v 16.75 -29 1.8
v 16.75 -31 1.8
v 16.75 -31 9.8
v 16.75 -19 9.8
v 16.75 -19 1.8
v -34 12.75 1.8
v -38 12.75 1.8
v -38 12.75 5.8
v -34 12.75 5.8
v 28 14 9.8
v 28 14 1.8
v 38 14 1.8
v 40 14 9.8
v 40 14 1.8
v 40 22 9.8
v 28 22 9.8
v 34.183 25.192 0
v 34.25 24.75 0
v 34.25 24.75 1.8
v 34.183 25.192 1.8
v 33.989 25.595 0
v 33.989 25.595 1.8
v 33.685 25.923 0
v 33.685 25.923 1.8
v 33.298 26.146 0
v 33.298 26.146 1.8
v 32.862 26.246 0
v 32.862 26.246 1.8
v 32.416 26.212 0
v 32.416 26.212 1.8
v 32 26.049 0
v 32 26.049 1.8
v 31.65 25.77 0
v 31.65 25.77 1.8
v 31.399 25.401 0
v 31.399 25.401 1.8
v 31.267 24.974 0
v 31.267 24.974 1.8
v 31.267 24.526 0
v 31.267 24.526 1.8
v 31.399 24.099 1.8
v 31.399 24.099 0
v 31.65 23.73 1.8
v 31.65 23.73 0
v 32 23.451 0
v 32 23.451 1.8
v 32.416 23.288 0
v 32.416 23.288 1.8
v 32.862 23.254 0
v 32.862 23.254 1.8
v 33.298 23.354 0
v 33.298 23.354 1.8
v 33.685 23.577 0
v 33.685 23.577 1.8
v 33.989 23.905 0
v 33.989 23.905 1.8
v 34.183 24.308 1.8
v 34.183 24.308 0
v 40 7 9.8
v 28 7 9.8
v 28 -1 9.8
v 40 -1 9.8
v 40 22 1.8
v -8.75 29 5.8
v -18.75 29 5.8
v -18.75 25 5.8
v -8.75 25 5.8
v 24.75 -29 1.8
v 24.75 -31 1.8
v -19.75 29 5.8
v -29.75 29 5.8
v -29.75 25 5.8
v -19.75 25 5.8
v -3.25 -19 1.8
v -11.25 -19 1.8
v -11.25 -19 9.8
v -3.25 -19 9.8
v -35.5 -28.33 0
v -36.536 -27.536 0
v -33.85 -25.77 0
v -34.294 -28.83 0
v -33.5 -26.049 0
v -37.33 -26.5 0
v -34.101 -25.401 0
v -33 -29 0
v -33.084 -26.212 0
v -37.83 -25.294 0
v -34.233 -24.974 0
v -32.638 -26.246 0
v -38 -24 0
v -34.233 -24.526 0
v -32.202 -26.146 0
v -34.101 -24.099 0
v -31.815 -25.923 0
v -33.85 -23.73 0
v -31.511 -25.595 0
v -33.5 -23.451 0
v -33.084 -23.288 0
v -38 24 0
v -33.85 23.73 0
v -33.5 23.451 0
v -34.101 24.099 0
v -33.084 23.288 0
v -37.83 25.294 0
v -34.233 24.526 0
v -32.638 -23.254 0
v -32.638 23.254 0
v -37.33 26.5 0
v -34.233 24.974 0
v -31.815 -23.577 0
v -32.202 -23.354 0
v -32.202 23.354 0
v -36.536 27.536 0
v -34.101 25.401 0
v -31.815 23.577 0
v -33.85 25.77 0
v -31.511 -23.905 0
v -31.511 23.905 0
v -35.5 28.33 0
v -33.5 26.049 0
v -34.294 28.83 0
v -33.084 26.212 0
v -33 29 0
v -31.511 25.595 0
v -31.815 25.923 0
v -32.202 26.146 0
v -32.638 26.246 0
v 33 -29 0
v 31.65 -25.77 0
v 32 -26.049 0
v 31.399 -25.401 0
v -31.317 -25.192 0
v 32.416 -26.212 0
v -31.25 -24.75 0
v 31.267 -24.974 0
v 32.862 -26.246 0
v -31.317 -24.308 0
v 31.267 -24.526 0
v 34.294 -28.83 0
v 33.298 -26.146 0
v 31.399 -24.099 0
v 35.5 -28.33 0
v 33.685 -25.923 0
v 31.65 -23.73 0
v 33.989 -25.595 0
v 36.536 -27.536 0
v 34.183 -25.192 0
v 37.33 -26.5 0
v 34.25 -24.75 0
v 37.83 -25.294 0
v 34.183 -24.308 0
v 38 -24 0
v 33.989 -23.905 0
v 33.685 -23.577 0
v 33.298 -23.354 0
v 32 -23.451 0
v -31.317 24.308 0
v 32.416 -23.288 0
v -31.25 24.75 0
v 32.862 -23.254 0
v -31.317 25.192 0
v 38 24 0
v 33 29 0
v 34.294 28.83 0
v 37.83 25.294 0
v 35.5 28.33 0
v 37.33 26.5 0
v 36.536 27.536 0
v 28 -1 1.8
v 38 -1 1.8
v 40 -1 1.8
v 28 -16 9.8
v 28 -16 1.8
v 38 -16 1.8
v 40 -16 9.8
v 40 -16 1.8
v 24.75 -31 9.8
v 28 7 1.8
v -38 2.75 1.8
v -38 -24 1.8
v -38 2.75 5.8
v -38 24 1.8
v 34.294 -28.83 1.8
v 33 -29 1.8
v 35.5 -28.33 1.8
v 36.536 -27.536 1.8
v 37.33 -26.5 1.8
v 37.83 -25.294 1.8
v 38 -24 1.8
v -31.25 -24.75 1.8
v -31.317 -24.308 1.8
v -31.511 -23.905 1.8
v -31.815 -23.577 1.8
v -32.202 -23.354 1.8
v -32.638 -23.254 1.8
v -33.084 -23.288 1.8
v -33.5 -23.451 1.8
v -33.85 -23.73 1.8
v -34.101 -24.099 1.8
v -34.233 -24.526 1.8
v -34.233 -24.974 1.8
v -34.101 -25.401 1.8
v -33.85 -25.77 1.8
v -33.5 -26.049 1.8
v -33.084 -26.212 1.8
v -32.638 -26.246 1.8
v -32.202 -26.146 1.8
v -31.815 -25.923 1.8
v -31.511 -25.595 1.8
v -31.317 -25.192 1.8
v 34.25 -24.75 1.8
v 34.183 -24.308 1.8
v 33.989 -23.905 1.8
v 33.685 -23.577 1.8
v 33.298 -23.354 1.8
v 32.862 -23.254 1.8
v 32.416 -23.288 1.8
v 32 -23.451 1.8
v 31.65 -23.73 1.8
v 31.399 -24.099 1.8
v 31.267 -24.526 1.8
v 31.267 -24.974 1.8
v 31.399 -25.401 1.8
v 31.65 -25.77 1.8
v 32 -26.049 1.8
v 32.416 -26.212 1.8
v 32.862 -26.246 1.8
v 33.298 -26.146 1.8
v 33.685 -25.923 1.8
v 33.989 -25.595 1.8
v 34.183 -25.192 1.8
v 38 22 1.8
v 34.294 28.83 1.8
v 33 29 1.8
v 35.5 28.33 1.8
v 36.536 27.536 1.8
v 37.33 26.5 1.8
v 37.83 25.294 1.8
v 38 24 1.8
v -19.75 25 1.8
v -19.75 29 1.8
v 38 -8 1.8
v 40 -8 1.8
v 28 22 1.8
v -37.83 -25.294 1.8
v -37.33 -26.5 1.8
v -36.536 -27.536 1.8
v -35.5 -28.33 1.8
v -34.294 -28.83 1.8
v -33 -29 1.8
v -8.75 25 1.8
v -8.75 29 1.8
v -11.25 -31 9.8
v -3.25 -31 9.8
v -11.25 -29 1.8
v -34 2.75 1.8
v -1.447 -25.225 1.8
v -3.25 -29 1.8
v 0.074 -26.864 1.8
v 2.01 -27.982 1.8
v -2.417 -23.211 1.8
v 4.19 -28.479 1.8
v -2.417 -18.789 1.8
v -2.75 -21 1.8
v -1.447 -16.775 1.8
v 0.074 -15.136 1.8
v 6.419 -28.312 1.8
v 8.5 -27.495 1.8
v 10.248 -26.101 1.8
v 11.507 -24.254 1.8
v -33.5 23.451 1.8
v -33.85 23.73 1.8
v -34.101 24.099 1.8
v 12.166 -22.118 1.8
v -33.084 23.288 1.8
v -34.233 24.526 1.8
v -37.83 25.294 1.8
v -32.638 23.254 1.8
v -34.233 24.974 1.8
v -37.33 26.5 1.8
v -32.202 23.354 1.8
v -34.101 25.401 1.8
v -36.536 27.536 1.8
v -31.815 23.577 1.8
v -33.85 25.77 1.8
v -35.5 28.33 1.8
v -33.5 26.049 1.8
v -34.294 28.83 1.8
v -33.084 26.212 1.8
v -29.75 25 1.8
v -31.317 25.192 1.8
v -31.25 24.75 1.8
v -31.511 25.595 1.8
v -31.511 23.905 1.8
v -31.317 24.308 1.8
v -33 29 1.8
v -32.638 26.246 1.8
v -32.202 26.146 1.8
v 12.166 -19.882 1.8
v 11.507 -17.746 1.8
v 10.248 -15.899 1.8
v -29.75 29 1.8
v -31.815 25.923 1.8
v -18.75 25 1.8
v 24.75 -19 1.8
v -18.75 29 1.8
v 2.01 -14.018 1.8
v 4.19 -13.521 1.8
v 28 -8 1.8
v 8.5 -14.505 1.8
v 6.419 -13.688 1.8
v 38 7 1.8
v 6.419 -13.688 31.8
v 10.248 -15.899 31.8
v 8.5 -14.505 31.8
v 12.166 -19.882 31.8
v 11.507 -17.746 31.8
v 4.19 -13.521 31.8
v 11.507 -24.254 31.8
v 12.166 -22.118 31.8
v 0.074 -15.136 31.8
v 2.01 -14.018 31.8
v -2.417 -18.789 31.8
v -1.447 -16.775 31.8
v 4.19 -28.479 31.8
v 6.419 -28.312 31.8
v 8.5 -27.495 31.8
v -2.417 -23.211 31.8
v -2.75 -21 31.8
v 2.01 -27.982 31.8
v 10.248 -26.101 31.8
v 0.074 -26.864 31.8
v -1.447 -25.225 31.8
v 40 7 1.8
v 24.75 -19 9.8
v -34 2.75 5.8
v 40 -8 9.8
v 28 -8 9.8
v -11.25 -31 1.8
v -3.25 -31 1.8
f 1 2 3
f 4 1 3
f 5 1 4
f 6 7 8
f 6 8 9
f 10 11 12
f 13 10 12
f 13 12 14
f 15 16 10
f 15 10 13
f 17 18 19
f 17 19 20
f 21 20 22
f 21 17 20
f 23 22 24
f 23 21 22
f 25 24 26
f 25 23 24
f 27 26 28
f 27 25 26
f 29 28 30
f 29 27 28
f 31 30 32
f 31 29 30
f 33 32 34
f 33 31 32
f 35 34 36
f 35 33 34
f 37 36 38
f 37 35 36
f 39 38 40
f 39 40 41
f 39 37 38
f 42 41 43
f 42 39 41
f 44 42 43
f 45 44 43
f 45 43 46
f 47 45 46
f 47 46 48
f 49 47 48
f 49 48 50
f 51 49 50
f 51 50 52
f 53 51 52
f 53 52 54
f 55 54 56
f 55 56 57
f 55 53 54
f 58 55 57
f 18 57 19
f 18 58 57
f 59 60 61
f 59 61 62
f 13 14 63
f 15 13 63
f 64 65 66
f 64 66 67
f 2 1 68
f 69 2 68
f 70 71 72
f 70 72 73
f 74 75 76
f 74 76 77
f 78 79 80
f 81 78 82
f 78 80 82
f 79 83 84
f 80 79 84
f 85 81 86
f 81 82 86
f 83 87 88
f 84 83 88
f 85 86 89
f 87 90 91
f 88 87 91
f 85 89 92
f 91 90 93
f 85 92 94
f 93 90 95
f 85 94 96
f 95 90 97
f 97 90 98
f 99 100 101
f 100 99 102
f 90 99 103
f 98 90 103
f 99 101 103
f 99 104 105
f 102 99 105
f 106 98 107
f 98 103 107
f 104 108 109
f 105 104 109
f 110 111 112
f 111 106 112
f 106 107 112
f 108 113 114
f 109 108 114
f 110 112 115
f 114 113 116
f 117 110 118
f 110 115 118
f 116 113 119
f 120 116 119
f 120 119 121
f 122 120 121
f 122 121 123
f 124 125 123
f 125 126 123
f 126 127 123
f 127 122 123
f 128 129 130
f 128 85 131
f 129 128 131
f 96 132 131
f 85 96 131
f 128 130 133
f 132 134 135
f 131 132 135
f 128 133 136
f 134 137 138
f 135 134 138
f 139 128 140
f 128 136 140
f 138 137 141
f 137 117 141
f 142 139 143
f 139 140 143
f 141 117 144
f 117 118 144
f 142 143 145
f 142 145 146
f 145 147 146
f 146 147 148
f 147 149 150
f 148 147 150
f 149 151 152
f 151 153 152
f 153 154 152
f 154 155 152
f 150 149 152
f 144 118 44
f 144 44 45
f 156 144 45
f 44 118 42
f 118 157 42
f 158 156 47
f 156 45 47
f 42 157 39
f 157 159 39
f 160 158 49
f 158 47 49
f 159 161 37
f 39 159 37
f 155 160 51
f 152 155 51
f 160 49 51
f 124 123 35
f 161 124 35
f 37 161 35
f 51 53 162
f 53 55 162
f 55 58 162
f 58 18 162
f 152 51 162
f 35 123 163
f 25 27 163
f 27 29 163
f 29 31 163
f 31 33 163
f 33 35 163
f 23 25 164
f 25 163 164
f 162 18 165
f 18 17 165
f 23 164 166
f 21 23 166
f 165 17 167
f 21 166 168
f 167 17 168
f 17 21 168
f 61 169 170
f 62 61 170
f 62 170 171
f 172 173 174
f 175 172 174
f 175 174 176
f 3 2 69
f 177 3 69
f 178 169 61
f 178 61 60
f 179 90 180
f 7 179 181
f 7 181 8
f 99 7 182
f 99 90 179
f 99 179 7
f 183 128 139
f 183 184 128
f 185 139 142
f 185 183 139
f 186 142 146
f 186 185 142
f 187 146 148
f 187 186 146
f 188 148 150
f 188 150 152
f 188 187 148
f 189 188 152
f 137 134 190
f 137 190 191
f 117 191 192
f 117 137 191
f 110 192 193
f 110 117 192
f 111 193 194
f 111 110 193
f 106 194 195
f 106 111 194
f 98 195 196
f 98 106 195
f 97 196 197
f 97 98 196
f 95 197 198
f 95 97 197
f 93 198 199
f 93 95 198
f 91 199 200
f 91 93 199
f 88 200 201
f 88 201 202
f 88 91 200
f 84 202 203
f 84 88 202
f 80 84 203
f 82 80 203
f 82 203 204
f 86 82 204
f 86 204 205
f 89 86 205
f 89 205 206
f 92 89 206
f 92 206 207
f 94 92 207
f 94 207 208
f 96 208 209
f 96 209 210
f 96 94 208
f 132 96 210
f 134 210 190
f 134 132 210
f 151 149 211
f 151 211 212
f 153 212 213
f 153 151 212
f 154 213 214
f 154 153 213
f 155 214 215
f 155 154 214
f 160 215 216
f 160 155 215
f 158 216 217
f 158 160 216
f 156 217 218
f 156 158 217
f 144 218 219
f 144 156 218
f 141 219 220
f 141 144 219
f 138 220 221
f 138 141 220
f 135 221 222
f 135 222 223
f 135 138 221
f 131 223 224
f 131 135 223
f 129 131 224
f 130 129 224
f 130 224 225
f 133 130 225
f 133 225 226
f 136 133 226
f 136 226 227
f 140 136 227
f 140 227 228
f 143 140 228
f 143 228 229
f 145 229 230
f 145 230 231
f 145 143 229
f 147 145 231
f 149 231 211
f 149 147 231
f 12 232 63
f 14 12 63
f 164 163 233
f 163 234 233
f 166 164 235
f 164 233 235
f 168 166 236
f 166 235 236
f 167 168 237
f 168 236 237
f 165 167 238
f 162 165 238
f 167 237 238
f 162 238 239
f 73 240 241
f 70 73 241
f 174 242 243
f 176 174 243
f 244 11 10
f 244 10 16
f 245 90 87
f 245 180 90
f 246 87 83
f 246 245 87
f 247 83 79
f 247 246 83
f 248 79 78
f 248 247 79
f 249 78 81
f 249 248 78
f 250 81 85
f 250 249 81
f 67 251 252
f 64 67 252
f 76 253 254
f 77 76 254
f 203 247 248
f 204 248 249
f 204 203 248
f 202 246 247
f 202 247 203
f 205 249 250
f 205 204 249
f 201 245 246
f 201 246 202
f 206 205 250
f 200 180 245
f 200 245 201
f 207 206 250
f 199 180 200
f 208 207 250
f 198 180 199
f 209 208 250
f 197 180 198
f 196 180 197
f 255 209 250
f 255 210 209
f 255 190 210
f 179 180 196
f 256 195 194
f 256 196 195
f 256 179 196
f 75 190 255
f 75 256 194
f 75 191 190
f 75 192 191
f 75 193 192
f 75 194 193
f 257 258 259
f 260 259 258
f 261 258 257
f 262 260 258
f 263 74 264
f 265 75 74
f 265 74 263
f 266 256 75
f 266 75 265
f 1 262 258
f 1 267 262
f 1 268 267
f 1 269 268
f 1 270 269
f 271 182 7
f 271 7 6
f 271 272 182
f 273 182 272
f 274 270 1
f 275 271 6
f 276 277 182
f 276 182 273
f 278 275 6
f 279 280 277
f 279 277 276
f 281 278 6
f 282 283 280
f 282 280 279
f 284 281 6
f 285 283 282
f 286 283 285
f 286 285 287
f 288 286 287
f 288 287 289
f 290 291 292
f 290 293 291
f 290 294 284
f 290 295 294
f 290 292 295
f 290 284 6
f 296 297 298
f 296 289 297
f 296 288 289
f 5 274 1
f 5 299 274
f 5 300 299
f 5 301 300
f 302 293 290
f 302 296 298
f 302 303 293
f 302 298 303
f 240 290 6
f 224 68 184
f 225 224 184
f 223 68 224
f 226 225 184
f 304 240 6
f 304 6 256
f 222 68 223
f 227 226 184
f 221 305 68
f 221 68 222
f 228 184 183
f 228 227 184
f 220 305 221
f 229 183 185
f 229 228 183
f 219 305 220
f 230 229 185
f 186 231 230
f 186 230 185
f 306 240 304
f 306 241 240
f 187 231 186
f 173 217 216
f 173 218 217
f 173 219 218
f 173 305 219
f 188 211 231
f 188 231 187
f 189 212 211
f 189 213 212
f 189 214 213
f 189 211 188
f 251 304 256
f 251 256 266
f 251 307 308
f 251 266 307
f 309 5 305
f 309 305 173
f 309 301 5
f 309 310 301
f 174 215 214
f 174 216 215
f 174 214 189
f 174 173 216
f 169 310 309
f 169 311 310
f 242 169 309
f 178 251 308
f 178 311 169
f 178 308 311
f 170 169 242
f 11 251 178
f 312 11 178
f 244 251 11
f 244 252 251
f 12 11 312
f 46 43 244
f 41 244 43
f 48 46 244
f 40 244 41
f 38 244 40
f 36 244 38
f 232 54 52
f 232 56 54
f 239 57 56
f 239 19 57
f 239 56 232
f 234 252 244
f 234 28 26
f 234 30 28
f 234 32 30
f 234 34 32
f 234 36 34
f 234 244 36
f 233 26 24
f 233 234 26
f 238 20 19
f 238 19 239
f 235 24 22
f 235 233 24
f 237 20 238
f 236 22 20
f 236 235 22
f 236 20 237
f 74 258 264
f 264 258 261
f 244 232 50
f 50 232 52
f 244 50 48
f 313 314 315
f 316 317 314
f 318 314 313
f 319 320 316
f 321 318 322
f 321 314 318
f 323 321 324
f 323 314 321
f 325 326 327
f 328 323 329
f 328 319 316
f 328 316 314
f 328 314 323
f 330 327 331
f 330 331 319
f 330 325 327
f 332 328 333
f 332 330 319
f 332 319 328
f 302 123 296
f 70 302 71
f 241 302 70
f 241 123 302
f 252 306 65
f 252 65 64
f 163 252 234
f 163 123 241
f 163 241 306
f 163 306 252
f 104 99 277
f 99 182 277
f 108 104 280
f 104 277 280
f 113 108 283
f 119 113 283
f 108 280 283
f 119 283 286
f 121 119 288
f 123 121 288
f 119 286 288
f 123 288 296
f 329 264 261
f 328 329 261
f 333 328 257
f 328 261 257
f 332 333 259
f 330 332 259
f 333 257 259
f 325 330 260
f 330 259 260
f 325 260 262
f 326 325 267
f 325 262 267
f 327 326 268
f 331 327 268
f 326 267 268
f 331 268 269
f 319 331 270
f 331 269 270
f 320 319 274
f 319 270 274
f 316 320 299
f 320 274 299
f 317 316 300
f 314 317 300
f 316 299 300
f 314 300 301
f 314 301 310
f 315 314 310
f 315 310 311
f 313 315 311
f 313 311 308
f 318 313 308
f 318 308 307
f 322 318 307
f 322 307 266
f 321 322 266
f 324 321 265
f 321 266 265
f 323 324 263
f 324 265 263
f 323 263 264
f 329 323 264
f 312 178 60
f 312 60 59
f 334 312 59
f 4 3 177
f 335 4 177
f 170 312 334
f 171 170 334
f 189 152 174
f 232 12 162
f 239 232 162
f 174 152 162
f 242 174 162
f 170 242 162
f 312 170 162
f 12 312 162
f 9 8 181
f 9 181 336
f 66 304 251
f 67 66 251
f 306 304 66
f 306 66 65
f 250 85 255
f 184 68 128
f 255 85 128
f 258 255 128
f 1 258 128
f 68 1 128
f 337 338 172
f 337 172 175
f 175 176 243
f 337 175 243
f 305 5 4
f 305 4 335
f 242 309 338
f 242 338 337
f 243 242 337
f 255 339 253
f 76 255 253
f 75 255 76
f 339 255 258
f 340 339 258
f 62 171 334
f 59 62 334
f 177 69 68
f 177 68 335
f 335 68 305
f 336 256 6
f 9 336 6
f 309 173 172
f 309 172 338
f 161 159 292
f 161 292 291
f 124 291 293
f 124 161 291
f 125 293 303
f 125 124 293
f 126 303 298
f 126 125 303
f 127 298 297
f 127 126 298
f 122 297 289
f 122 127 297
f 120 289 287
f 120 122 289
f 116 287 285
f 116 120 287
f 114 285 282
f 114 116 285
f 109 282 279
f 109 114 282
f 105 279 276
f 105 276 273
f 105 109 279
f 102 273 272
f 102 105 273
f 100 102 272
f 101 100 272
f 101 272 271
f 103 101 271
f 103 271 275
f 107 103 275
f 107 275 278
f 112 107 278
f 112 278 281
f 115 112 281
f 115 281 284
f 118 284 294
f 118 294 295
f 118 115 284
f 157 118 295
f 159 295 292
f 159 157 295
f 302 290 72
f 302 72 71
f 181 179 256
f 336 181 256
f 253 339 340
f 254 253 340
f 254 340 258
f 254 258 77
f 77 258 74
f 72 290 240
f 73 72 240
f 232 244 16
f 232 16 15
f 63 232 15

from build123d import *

# Parameters (mm, degrees)
SKETCH_1_W      = 76
SKETCH_1_H      = 58
SKETCH_1_R      = 1.5
EXTRUDE_1_DEPTH = 1.8
SKETCH_2_W      = 12
SKETCH_2_H      = 8
SKETCH_2_W_2    = 8
SKETCH_2_H_2    = 12
EXTRUDE_2_DEPTH = 8
SKETCH_3_W      = 10
SKETCH_3_H      = 4
SKETCH_3_W_2    = 4
SKETCH_3_H_2    = 10
EXTRUDE_3_DEPTH = 4
SKETCH_4_R      = 7.5
EXTRUDE_4_DEPTH = 30
FILLET_1_R      = 5


with BuildPart() as part:
    # 草图1 → 凸台-拉伸1 (new body)
    with BuildSketch(Plane.XY):
        Rectangle(SKETCH_1_W, SKETCH_1_H)
        with Locations((-32.75, 24.75)):
            Circle(SKETCH_1_R, mode=Mode.SUBTRACT)
        with Locations((-32.75, -24.75)):
            Circle(SKETCH_1_R, mode=Mode.SUBTRACT)
        with Locations((32.75, -24.75)):
            Circle(SKETCH_1_R, mode=Mode.SUBTRACT)
        with Locations((32.75, 24.75)):
            Circle(SKETCH_1_R, mode=Mode.SUBTRACT)
    extrude(amount=EXTRUDE_1_DEPTH)

    # 草图2 → 凸台-拉伸2 (add)
    with BuildSketch(Plane.XY.offset(1.8)):
        with Locations((34, 18)):
            Rectangle(SKETCH_2_W, SKETCH_2_H)
        with Locations((34, 3)):
            Rectangle(SKETCH_2_W, SKETCH_2_H)
        with Locations((34, -12)):
            Rectangle(SKETCH_2_W, SKETCH_2_H)
        with Locations((-7.25, -25)):
            Rectangle(SKETCH_2_W_2, SKETCH_2_H_2)
        with Locations((20.75, -25)):
            Rectangle(SKETCH_2_W_2, SKETCH_2_H_2)
    extrude(amount=EXTRUDE_2_DEPTH)

    # 草图3 → 凸台-拉伸3 (add)
    with BuildSketch(Plane.XY.offset(1.8)):
        with Locations((-24.75, 27)):
            Rectangle(SKETCH_3_W, SKETCH_3_H)
        with Locations((-13.75, 27)):
            Rectangle(SKETCH_3_W, SKETCH_3_H)
        with Locations((-36, 7.75)):
            Rectangle(SKETCH_3_W_2, SKETCH_3_H_2)
    extrude(amount=EXTRUDE_3_DEPTH)

    # 草图4 → 凸台-拉伸4 (add)
    with BuildSketch(Plane.XY.offset(1.8)):
        with Locations(Location((4.75, -21, 0), (0, 0, 180))):
            Circle(SKETCH_4_R)
    extrude(amount=EXTRUDE_4_DEPTH)

    # 圆角1
    fillet_1_edges = [part.edges().sort_by_distance(p)[0] for p in [
        (38, -29, 0.9),
        (-38, -29, 0.9),
        (-38, 29, 0.9),
        (38, 29, 0.9),
    ]]
    fillet(fillet_1_edges, radius=FILLET_1_R)


solid = part.part
